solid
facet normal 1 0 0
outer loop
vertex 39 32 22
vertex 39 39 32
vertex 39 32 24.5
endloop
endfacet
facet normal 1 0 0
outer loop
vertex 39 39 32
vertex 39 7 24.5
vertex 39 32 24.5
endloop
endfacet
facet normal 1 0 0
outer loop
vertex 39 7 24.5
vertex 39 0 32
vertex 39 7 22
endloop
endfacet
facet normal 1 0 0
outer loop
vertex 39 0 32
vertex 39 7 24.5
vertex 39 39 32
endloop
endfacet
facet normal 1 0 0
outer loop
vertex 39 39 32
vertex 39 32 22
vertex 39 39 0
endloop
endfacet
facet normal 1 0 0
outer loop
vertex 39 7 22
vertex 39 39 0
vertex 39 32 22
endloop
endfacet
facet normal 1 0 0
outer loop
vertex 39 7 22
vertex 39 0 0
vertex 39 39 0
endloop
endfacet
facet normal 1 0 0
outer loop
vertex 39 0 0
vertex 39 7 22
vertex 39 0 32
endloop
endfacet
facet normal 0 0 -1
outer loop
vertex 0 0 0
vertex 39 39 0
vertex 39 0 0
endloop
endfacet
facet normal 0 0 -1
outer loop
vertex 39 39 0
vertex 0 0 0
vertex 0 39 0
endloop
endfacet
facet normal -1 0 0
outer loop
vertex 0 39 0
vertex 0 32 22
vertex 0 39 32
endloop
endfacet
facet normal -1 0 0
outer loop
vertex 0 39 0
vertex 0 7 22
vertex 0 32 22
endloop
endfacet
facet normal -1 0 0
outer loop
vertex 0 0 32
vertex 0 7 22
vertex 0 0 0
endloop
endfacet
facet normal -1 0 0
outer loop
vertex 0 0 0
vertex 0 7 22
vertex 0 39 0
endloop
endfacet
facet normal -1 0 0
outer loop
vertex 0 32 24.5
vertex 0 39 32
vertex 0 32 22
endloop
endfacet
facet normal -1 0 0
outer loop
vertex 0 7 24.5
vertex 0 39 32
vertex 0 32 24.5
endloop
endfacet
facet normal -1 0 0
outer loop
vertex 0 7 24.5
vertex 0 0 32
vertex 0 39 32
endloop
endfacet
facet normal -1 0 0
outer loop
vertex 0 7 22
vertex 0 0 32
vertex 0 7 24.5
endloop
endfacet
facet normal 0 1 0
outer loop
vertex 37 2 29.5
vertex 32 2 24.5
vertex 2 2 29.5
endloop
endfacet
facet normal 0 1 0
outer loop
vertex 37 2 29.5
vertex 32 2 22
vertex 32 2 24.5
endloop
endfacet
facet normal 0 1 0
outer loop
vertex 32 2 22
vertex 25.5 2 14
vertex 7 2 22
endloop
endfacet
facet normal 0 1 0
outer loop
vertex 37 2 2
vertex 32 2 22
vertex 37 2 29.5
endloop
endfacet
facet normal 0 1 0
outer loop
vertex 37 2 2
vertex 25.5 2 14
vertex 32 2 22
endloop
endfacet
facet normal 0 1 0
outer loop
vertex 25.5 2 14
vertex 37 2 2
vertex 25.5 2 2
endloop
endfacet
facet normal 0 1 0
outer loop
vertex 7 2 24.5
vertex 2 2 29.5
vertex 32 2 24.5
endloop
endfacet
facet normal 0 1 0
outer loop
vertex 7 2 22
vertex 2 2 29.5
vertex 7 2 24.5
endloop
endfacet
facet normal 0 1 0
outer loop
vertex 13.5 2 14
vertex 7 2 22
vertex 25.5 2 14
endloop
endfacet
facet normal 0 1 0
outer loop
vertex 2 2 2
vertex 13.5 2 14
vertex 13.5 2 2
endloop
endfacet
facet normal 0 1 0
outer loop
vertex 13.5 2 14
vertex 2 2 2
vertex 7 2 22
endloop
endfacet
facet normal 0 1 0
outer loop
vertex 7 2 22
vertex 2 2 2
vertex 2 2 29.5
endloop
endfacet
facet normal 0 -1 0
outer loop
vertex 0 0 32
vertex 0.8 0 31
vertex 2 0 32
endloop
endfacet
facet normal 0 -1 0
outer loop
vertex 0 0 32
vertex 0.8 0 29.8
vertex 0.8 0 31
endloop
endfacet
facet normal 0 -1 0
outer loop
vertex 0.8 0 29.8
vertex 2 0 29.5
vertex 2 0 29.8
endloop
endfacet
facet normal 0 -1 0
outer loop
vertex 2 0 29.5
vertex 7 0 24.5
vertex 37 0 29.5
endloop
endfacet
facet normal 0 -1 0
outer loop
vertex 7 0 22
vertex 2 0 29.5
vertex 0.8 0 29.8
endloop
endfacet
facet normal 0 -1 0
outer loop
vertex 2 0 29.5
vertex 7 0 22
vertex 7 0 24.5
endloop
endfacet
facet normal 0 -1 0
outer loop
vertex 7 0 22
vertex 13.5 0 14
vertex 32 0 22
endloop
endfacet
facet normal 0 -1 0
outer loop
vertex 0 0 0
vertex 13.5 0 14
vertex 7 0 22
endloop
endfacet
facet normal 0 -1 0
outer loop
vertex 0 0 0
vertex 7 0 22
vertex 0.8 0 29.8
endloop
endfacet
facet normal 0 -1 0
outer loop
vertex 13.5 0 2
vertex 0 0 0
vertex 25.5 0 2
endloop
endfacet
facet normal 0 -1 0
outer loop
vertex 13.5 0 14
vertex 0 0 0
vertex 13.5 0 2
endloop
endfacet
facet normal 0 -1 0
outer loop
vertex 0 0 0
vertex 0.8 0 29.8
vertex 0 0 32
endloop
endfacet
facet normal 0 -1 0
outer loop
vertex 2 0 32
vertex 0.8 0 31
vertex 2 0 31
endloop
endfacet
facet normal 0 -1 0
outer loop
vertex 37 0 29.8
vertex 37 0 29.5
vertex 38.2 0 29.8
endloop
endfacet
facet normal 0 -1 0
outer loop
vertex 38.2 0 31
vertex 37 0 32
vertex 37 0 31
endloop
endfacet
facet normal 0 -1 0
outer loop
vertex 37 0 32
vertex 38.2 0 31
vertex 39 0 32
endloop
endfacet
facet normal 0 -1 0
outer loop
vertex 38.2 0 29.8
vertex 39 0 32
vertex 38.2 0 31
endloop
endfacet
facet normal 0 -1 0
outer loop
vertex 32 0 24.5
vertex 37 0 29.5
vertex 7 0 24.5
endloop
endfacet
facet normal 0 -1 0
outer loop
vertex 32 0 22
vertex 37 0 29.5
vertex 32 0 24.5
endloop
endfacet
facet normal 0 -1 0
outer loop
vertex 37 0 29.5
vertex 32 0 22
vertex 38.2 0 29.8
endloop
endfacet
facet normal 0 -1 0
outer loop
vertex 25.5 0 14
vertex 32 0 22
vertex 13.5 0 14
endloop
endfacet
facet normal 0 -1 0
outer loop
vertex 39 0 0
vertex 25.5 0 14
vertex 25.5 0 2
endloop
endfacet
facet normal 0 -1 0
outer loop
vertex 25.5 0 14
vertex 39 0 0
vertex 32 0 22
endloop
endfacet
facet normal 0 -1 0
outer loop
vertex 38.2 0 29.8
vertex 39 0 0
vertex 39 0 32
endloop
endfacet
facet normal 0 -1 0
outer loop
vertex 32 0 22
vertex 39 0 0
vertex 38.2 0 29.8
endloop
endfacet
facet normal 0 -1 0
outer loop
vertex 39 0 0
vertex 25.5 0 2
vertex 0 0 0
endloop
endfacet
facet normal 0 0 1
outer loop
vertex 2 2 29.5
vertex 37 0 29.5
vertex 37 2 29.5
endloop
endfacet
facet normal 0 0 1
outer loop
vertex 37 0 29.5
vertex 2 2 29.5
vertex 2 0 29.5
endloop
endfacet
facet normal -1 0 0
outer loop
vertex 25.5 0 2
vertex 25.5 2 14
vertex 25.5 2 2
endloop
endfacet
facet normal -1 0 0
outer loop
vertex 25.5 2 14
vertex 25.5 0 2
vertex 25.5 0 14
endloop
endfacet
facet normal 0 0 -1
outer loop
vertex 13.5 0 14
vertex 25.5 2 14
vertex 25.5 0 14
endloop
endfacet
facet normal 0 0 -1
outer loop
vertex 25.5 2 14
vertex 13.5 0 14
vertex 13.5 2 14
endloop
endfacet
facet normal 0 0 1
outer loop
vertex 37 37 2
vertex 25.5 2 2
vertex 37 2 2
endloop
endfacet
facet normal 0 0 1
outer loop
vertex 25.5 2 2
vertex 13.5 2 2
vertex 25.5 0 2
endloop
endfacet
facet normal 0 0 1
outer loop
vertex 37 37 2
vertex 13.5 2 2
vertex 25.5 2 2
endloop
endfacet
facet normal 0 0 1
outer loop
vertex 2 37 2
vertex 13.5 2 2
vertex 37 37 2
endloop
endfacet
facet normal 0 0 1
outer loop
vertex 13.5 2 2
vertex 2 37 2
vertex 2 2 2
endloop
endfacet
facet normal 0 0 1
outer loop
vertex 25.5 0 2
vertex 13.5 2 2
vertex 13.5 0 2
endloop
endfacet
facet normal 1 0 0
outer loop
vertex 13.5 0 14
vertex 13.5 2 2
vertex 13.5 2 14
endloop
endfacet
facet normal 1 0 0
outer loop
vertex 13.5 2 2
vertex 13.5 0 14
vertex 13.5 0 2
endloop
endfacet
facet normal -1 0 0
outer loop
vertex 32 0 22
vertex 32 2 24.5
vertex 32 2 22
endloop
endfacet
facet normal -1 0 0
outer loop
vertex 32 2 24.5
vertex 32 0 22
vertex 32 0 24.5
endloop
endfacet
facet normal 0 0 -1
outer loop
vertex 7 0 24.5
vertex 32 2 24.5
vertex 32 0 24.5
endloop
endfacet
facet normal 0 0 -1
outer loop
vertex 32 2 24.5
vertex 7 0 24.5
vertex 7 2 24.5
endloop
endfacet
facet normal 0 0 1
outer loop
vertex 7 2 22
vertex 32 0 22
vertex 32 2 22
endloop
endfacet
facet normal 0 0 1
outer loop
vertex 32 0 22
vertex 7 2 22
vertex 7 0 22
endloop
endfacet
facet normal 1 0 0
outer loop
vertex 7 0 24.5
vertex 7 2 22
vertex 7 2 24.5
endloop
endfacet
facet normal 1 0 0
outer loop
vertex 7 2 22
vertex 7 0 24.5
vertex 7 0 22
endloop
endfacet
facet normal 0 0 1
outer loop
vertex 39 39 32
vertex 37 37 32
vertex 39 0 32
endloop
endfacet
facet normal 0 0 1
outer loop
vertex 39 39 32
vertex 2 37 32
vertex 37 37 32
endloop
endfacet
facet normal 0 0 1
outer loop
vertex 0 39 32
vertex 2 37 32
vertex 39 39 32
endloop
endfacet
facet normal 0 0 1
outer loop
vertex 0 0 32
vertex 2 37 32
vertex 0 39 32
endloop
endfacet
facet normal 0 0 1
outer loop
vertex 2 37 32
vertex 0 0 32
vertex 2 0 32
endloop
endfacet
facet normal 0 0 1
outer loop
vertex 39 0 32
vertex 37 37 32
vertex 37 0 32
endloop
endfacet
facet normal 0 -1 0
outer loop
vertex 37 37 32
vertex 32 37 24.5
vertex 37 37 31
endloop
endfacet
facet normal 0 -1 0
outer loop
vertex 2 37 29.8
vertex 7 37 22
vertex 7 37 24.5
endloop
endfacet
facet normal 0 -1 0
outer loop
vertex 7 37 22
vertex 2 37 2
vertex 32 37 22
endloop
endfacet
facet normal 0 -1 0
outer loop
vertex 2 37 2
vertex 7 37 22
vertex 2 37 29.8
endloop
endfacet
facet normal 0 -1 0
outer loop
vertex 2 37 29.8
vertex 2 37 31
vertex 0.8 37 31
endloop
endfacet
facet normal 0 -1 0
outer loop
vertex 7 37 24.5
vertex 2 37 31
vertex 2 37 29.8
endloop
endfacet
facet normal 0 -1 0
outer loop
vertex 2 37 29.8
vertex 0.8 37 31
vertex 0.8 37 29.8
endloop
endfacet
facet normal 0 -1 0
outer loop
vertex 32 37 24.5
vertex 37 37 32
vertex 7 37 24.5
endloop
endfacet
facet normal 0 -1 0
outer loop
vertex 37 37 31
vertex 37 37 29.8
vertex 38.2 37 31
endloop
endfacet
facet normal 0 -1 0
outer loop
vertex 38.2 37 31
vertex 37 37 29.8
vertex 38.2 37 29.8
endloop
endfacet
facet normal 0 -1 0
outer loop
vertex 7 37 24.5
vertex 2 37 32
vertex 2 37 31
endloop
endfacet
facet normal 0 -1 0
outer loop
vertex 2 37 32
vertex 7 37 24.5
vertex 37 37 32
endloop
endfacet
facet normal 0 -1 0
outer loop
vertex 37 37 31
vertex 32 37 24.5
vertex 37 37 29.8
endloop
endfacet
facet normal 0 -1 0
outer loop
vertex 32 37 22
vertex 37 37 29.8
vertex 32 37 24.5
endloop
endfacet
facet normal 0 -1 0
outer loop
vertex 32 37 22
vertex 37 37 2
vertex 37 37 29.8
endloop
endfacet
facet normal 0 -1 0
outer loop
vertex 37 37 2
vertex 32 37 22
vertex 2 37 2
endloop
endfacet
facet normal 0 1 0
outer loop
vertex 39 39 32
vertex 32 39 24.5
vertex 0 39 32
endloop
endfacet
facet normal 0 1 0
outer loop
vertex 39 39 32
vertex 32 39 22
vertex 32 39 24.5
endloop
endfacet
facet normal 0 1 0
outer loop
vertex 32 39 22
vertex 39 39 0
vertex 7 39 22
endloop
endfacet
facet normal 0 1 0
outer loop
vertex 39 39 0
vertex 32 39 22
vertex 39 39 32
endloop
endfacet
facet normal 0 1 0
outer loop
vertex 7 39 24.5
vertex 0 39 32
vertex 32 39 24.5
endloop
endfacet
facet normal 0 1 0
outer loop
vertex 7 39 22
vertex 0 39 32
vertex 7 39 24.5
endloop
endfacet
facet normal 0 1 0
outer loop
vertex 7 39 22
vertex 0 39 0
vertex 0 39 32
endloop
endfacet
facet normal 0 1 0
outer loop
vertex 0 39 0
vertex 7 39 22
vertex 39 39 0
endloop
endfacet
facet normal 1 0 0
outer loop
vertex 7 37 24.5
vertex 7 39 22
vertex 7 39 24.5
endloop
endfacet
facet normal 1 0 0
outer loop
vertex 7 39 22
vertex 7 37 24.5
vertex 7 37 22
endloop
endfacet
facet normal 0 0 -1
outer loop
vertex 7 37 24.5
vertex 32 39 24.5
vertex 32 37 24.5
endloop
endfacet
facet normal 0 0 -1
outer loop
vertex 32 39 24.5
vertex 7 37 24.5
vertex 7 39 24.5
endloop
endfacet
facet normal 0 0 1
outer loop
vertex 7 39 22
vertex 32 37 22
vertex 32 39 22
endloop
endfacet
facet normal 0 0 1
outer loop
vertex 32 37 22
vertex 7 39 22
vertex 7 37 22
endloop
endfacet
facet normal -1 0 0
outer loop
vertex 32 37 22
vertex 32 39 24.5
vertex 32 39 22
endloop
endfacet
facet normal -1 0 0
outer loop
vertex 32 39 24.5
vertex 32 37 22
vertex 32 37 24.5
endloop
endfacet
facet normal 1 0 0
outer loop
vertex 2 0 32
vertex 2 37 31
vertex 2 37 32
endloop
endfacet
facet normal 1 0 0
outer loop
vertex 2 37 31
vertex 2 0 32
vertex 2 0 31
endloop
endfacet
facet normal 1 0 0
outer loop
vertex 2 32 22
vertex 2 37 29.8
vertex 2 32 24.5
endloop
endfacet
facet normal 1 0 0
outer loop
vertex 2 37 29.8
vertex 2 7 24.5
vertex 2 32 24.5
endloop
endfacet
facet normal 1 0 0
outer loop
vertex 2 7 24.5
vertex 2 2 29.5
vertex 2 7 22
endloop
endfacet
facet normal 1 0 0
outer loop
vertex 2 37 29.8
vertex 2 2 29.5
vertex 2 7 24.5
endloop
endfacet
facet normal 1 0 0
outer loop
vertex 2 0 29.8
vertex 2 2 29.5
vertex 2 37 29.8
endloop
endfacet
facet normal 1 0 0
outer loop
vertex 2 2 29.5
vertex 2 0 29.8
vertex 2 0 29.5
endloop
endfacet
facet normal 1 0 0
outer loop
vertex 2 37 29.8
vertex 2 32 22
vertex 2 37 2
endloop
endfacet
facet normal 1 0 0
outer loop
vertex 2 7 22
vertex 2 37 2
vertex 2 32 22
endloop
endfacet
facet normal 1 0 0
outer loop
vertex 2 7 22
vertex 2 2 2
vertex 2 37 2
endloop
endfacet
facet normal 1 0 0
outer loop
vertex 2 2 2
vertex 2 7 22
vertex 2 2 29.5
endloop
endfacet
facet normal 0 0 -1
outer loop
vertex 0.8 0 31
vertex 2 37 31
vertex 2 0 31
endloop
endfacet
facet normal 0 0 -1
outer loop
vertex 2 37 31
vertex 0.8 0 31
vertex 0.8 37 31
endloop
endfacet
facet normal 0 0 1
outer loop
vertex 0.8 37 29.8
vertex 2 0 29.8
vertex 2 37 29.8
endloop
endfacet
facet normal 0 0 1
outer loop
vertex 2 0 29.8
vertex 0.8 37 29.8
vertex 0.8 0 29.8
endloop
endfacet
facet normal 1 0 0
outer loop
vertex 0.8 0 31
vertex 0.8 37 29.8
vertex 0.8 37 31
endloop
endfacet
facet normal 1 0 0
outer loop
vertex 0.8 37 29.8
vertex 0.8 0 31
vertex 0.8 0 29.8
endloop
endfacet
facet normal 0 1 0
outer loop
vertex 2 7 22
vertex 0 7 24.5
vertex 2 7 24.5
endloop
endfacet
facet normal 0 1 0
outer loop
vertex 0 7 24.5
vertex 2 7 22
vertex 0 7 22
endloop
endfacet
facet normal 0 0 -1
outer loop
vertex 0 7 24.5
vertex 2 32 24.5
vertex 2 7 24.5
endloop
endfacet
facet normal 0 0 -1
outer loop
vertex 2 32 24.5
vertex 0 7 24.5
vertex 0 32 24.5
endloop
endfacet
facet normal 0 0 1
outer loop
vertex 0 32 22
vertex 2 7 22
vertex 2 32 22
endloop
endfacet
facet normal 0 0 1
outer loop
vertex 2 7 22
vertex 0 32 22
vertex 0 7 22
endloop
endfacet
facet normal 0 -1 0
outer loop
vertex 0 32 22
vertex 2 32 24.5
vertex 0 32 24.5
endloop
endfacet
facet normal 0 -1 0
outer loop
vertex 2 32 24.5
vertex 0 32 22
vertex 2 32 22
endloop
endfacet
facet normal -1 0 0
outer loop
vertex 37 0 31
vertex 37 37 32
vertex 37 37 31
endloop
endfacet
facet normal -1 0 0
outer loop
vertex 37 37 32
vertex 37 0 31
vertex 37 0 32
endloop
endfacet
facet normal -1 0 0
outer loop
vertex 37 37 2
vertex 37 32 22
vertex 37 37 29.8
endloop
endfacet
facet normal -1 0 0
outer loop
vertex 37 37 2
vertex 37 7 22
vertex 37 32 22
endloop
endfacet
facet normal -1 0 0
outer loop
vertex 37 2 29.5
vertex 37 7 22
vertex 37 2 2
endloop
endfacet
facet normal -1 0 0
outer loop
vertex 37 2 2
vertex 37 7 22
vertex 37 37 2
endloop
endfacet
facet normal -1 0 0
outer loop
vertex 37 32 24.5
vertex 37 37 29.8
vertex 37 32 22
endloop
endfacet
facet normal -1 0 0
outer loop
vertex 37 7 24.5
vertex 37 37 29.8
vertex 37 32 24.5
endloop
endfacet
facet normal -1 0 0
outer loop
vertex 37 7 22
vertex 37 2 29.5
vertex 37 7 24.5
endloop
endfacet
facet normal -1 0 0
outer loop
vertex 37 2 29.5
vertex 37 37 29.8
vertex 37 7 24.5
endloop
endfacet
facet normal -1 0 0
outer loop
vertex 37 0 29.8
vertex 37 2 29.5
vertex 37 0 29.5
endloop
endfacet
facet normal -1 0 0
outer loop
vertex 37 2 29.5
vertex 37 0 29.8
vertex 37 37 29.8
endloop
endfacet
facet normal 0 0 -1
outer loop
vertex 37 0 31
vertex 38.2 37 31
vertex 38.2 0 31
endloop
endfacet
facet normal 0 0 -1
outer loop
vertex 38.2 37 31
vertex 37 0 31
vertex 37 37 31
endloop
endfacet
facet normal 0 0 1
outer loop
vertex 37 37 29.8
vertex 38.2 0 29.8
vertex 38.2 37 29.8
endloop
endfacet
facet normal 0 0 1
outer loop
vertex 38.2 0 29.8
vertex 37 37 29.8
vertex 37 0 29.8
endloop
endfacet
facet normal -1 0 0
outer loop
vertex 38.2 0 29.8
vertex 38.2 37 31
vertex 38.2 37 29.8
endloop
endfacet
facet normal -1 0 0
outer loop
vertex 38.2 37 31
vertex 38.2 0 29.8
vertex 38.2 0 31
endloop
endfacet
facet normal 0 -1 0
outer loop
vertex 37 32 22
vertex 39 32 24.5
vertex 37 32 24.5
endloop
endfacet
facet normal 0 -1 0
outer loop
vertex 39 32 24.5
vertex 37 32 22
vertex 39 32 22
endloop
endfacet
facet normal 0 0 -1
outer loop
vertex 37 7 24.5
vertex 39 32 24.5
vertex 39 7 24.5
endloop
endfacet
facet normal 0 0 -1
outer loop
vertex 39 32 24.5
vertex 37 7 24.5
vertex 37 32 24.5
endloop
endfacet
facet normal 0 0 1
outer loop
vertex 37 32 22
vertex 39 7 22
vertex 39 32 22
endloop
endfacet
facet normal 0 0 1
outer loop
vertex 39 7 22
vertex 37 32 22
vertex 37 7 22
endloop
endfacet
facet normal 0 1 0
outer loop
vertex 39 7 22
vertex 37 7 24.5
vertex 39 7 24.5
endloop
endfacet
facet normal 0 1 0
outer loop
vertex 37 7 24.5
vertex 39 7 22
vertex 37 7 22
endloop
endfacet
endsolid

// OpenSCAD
l=35;
w=35;
h=30;
t=2;

slot=1.2;
trim=2.5;

module cutout(x,z,len,height)
{
    translate([x+t,-t,z+t]){
        cube([len,3*t,height]);
    }
}

// Bottom
cube([w+2*t,l+2*t,t]);


// Front
translate([0,0,0]){
    rotate([0,0,0]){ 
        difference(){
           cube([w+2*t,t,h+t]);
            
           translate([0,-t,h+t-trim]){
               cube([w*2*t,3*t,trim]);
           }
           cutout(11.5,0,12,12);
           cutout(5,20,25,2.5);
        }
    }
}

// Back
translate([w+2*t,l+2*t,0]){
    rotate([0,0,180]){
        difference(){
           cube([w+2*t,t,h+t]);
            
            cutout(5,20,25,2.5);
        }
    }
}

// Left
translate([0,l+2*t,0]){
    rotate([0,0,-90]){ 
        difference() {
           cube([l+2*t,t,h+t]);
           translate([0,t-slot,h+t-slot-1]){
               cube([l+2*t,slot+.2,slot]);
           }
            cutout(5,20,25,2.5);
        }
    }
}

// Right
translate([w+2*t,0,0]){
    rotate([0,0,90]){
        difference(){ 
           cube([l+2*t,t,h+t]);
            
            translate([0,t-slot,h+t-slot-1]){
               cube([l+2*t,slot+0.2,slot]);
           }
            cutout(5,20,25,2.5);
            //cutout(35,0,25,6);
            
        }
    }
}
